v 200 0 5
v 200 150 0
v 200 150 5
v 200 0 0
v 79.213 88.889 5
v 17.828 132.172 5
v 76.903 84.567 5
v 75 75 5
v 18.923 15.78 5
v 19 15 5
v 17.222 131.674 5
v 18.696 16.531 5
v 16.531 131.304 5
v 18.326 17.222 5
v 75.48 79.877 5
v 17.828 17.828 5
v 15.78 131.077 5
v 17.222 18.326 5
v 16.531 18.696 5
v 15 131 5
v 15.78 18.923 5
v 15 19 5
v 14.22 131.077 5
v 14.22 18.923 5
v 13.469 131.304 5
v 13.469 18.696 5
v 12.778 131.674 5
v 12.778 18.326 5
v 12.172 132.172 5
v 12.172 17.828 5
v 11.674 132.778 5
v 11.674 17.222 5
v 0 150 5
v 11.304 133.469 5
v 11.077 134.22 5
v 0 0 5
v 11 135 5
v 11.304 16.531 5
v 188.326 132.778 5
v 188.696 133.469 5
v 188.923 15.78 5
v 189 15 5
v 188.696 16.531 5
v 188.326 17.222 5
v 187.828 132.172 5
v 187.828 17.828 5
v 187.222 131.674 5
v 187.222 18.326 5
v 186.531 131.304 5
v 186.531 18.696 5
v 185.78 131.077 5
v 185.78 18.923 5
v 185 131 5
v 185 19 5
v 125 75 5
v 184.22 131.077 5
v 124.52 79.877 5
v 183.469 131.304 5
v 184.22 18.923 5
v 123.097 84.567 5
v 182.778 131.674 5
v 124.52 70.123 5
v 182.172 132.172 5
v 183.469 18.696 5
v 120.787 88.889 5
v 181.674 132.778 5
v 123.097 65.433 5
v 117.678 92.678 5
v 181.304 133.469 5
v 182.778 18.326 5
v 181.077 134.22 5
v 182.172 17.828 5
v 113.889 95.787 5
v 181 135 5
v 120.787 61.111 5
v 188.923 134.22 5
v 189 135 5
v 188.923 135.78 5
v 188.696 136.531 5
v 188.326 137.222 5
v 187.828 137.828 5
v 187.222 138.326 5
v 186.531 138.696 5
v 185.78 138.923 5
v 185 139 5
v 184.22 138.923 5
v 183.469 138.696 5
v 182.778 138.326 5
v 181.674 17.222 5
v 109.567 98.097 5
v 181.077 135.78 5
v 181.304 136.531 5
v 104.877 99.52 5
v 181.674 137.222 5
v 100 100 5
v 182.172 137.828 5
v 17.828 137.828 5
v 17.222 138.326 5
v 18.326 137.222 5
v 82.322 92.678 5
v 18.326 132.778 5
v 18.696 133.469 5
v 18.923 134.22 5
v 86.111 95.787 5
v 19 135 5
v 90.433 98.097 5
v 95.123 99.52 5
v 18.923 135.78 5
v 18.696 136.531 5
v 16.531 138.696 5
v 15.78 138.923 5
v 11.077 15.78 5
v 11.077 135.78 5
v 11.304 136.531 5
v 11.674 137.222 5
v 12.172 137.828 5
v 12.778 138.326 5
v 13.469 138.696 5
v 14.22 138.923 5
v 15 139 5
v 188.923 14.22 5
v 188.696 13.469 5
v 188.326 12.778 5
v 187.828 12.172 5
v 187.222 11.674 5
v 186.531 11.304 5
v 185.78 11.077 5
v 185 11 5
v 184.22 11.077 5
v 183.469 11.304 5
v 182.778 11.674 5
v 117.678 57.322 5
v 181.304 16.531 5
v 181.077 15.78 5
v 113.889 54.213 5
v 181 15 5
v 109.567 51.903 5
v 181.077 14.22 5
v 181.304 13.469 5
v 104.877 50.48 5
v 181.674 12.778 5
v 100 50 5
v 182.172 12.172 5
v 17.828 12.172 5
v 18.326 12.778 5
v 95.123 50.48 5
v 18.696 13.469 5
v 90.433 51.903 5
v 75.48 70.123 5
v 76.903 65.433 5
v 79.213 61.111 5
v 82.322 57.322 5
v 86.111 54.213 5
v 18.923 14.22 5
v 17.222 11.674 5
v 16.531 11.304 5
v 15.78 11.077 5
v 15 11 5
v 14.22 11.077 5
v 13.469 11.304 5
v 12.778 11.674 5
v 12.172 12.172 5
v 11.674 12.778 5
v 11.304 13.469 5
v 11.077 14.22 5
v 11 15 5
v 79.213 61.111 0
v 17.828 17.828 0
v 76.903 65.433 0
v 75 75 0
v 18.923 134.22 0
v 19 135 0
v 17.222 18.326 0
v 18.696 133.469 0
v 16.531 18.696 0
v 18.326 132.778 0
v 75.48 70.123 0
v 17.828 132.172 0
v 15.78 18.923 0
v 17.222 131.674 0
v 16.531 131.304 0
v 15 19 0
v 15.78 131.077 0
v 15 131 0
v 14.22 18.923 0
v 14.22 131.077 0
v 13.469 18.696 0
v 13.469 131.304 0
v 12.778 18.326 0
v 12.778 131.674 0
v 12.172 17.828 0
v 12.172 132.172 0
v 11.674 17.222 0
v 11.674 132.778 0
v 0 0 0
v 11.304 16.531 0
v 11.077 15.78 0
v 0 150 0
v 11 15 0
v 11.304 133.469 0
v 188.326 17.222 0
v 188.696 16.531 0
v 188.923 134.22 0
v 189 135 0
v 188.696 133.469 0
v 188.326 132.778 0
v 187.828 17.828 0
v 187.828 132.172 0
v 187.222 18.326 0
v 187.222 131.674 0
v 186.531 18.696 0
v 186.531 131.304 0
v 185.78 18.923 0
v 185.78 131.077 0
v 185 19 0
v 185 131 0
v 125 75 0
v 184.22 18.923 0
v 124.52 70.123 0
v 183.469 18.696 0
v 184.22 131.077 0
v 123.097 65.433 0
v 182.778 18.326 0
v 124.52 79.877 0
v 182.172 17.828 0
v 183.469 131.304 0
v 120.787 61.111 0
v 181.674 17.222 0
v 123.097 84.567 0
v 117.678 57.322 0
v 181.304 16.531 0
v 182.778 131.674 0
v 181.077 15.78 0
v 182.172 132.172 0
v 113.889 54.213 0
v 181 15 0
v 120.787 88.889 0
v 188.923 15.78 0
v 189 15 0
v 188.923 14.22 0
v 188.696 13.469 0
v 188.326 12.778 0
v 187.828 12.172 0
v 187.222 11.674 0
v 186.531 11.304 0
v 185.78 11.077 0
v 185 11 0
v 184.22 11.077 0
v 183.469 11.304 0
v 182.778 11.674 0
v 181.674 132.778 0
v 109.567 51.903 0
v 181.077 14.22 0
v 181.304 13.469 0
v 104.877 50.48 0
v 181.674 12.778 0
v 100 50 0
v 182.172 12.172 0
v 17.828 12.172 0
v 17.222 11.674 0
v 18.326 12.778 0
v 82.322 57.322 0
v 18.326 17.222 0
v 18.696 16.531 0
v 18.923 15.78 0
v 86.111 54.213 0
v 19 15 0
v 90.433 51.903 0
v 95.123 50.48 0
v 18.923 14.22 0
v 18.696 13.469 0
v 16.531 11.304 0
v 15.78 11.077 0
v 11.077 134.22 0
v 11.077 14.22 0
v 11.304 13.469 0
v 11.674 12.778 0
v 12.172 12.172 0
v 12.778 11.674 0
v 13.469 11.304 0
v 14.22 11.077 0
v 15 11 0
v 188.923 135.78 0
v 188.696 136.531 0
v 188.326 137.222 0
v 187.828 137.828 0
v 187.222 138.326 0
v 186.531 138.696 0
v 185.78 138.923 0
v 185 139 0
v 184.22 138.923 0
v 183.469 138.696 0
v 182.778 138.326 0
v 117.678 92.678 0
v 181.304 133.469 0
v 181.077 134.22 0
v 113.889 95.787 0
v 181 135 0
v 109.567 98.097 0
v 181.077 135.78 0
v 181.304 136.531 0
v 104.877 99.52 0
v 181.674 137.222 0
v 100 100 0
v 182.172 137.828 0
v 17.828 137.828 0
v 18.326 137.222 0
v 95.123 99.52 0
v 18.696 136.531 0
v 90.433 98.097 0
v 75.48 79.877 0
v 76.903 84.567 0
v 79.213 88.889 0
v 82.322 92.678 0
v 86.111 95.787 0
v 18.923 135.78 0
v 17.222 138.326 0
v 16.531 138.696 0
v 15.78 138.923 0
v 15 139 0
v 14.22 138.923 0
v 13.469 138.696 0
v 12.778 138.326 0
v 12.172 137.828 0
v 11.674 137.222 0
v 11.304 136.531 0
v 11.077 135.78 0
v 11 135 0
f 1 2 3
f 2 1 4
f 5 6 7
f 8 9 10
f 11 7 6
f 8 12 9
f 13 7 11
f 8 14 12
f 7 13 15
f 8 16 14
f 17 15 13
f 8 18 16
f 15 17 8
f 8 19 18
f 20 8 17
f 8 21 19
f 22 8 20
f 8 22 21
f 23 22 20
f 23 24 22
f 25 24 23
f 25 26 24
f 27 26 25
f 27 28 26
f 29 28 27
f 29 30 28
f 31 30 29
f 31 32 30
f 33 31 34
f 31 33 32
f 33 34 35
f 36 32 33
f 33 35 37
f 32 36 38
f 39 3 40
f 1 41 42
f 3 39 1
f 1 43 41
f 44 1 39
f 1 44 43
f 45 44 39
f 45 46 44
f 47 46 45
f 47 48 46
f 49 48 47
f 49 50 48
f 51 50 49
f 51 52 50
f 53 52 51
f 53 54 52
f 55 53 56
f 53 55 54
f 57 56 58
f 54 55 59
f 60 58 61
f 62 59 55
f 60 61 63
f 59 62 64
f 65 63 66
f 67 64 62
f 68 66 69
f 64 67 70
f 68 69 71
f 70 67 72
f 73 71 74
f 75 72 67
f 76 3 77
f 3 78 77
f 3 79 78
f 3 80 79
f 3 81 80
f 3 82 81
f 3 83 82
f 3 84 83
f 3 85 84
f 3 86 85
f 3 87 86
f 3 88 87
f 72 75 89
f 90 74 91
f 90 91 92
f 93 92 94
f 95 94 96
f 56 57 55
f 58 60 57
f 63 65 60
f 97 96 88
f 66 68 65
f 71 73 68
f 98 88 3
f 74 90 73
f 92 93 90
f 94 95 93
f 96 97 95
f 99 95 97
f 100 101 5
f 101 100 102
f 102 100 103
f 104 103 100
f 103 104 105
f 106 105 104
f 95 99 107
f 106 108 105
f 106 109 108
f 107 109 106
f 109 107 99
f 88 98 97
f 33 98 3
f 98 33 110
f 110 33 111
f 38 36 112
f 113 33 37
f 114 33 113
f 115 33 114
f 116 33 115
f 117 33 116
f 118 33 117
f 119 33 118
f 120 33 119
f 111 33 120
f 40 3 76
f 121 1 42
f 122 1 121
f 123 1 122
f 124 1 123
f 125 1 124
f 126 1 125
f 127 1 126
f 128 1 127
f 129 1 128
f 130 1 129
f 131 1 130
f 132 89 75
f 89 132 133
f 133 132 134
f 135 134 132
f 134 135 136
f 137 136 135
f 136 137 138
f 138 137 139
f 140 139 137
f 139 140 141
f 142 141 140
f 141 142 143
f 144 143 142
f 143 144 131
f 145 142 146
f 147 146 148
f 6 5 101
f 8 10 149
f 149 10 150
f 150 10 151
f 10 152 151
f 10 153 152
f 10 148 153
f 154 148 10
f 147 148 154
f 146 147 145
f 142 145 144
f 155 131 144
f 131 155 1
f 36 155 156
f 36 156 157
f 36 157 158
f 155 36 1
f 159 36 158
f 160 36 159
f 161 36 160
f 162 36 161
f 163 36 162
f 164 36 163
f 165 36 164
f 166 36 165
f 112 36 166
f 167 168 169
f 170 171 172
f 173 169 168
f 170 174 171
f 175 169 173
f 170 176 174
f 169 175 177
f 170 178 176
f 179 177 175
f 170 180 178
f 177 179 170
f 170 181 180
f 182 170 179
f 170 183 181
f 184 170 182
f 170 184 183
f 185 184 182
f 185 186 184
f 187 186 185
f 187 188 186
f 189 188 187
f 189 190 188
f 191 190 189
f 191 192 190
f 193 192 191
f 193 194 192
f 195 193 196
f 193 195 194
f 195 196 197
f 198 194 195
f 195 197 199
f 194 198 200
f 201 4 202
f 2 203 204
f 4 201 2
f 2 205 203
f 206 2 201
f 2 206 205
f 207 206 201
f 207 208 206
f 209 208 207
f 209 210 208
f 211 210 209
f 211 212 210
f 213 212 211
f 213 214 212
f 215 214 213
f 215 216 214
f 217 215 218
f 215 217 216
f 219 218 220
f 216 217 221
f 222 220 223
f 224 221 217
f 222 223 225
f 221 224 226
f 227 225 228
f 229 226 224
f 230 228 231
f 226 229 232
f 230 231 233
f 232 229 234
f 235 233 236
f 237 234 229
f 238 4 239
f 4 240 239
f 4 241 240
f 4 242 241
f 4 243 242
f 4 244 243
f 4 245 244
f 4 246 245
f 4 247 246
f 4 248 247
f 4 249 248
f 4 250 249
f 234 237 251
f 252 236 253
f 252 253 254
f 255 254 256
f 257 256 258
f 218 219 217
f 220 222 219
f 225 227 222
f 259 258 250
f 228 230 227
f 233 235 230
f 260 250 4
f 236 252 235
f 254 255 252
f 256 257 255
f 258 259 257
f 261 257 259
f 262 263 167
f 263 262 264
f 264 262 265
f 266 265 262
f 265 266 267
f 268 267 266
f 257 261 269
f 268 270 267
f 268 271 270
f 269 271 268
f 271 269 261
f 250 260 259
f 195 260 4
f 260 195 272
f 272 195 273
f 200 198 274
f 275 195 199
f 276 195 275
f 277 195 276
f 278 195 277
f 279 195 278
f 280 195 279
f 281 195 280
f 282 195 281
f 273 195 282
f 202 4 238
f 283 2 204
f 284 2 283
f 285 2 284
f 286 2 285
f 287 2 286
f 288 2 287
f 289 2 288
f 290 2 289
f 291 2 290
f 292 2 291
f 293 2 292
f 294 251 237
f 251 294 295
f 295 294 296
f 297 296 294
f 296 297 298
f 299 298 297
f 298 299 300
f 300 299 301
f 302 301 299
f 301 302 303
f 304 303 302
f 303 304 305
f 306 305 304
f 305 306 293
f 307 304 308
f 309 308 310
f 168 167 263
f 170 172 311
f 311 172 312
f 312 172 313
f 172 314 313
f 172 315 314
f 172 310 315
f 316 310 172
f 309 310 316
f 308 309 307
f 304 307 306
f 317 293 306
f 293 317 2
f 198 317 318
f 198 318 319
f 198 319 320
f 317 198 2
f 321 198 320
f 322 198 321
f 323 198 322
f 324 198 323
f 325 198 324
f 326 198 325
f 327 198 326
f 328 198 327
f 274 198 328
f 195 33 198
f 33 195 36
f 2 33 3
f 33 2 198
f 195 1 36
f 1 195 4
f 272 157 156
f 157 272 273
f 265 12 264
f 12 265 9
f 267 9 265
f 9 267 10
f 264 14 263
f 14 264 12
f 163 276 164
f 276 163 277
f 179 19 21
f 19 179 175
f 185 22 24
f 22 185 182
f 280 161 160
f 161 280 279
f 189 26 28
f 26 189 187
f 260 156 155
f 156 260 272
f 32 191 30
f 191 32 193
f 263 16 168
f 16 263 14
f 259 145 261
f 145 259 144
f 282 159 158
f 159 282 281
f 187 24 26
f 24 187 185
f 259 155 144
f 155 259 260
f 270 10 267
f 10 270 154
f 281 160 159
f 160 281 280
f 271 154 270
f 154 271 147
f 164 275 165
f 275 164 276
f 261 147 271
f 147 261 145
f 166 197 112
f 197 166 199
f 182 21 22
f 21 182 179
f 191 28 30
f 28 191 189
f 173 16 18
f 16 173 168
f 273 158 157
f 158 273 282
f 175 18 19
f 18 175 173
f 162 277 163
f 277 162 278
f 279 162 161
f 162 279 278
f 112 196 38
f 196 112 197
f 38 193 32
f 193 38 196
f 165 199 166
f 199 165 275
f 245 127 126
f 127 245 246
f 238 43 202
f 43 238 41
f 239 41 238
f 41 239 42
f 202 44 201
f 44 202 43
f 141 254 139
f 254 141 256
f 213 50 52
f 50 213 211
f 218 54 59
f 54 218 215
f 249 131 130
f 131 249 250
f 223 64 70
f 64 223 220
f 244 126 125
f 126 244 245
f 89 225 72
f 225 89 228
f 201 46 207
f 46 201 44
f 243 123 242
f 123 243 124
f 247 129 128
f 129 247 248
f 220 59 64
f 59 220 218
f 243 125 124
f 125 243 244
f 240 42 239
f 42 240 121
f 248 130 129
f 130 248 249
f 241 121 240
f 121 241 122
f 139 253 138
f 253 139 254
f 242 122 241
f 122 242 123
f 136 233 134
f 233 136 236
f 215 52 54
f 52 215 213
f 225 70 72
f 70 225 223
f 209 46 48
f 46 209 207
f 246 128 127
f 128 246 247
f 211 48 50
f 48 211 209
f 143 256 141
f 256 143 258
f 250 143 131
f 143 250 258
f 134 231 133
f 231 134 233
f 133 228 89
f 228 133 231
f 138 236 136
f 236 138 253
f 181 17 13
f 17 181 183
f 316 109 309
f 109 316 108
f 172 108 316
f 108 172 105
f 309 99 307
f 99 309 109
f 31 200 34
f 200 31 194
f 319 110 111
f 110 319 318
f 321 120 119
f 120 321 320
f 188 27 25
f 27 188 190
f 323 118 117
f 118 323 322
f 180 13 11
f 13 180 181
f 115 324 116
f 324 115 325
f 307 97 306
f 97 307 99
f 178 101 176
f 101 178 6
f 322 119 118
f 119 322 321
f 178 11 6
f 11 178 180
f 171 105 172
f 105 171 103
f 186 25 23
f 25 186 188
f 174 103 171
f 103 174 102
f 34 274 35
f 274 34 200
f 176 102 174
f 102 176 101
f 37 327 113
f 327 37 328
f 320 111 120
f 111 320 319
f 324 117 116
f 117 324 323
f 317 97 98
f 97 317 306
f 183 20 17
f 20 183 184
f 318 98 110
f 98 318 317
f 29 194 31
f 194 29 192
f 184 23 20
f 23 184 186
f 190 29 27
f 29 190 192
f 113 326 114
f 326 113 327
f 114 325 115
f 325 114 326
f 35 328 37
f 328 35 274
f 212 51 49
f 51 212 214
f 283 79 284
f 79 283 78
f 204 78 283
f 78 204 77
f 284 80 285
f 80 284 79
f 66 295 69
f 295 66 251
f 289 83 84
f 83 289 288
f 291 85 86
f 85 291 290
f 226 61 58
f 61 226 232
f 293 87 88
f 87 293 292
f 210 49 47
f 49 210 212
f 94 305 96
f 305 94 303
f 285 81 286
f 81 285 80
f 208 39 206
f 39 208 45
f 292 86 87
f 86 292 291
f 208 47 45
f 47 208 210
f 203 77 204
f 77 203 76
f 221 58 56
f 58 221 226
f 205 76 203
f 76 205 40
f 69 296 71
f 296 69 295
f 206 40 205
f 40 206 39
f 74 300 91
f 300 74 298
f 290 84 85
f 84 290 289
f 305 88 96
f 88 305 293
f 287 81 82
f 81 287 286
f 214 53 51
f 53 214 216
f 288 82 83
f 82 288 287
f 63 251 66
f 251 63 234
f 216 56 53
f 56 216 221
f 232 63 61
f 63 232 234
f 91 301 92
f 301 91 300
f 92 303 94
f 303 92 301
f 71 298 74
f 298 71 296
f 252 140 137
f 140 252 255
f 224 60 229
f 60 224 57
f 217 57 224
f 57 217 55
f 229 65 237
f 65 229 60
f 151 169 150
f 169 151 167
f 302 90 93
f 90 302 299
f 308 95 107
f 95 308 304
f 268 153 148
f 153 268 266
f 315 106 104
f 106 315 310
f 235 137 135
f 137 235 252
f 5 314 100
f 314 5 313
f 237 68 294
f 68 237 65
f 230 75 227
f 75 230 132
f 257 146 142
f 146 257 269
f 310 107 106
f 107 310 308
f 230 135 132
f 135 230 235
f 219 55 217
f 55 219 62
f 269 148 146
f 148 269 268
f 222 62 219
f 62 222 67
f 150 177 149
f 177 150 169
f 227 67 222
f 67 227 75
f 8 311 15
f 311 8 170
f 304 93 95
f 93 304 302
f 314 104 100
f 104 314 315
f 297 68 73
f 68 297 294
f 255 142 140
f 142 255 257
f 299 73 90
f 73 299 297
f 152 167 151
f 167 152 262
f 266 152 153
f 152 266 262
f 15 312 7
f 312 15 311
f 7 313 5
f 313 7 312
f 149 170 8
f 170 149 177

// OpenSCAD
$fn = 32;

// ----------------------------------------------------------------------
// Big plate: 200-250 mm adapter plate
// ----------------------------------------------------------------------

// --- parameters (mm) ---
plate_l = 200;            // plate length, X
plate_w = 150;            // plate width, Y
plate_t = 5;              // plate thickness, Z
corner_d = 8;             // corner hole diameter
corner_in = 15;           // corner hole inset from the edges
bore_d = 50;              // central bore

difference() {
  cube([plate_l, plate_w, plate_t]);
  translate([corner_in, corner_in, -1]) cylinder(h = plate_t + 2, d = corner_d);
  translate([plate_l - corner_in, corner_in, -1]) cylinder(h = plate_t + 2, d = corner_d);
  translate([corner_in, plate_w - corner_in, -1]) cylinder(h = plate_t + 2, d = corner_d);
  translate([plate_l - corner_in, plate_w - corner_in, -1]) cylinder(h = plate_t + 2, d = corner_d);
  translate([plate_l / 2, plate_w / 2, -1]) cylinder(h = plate_t + 2, d = bore_d);
}
